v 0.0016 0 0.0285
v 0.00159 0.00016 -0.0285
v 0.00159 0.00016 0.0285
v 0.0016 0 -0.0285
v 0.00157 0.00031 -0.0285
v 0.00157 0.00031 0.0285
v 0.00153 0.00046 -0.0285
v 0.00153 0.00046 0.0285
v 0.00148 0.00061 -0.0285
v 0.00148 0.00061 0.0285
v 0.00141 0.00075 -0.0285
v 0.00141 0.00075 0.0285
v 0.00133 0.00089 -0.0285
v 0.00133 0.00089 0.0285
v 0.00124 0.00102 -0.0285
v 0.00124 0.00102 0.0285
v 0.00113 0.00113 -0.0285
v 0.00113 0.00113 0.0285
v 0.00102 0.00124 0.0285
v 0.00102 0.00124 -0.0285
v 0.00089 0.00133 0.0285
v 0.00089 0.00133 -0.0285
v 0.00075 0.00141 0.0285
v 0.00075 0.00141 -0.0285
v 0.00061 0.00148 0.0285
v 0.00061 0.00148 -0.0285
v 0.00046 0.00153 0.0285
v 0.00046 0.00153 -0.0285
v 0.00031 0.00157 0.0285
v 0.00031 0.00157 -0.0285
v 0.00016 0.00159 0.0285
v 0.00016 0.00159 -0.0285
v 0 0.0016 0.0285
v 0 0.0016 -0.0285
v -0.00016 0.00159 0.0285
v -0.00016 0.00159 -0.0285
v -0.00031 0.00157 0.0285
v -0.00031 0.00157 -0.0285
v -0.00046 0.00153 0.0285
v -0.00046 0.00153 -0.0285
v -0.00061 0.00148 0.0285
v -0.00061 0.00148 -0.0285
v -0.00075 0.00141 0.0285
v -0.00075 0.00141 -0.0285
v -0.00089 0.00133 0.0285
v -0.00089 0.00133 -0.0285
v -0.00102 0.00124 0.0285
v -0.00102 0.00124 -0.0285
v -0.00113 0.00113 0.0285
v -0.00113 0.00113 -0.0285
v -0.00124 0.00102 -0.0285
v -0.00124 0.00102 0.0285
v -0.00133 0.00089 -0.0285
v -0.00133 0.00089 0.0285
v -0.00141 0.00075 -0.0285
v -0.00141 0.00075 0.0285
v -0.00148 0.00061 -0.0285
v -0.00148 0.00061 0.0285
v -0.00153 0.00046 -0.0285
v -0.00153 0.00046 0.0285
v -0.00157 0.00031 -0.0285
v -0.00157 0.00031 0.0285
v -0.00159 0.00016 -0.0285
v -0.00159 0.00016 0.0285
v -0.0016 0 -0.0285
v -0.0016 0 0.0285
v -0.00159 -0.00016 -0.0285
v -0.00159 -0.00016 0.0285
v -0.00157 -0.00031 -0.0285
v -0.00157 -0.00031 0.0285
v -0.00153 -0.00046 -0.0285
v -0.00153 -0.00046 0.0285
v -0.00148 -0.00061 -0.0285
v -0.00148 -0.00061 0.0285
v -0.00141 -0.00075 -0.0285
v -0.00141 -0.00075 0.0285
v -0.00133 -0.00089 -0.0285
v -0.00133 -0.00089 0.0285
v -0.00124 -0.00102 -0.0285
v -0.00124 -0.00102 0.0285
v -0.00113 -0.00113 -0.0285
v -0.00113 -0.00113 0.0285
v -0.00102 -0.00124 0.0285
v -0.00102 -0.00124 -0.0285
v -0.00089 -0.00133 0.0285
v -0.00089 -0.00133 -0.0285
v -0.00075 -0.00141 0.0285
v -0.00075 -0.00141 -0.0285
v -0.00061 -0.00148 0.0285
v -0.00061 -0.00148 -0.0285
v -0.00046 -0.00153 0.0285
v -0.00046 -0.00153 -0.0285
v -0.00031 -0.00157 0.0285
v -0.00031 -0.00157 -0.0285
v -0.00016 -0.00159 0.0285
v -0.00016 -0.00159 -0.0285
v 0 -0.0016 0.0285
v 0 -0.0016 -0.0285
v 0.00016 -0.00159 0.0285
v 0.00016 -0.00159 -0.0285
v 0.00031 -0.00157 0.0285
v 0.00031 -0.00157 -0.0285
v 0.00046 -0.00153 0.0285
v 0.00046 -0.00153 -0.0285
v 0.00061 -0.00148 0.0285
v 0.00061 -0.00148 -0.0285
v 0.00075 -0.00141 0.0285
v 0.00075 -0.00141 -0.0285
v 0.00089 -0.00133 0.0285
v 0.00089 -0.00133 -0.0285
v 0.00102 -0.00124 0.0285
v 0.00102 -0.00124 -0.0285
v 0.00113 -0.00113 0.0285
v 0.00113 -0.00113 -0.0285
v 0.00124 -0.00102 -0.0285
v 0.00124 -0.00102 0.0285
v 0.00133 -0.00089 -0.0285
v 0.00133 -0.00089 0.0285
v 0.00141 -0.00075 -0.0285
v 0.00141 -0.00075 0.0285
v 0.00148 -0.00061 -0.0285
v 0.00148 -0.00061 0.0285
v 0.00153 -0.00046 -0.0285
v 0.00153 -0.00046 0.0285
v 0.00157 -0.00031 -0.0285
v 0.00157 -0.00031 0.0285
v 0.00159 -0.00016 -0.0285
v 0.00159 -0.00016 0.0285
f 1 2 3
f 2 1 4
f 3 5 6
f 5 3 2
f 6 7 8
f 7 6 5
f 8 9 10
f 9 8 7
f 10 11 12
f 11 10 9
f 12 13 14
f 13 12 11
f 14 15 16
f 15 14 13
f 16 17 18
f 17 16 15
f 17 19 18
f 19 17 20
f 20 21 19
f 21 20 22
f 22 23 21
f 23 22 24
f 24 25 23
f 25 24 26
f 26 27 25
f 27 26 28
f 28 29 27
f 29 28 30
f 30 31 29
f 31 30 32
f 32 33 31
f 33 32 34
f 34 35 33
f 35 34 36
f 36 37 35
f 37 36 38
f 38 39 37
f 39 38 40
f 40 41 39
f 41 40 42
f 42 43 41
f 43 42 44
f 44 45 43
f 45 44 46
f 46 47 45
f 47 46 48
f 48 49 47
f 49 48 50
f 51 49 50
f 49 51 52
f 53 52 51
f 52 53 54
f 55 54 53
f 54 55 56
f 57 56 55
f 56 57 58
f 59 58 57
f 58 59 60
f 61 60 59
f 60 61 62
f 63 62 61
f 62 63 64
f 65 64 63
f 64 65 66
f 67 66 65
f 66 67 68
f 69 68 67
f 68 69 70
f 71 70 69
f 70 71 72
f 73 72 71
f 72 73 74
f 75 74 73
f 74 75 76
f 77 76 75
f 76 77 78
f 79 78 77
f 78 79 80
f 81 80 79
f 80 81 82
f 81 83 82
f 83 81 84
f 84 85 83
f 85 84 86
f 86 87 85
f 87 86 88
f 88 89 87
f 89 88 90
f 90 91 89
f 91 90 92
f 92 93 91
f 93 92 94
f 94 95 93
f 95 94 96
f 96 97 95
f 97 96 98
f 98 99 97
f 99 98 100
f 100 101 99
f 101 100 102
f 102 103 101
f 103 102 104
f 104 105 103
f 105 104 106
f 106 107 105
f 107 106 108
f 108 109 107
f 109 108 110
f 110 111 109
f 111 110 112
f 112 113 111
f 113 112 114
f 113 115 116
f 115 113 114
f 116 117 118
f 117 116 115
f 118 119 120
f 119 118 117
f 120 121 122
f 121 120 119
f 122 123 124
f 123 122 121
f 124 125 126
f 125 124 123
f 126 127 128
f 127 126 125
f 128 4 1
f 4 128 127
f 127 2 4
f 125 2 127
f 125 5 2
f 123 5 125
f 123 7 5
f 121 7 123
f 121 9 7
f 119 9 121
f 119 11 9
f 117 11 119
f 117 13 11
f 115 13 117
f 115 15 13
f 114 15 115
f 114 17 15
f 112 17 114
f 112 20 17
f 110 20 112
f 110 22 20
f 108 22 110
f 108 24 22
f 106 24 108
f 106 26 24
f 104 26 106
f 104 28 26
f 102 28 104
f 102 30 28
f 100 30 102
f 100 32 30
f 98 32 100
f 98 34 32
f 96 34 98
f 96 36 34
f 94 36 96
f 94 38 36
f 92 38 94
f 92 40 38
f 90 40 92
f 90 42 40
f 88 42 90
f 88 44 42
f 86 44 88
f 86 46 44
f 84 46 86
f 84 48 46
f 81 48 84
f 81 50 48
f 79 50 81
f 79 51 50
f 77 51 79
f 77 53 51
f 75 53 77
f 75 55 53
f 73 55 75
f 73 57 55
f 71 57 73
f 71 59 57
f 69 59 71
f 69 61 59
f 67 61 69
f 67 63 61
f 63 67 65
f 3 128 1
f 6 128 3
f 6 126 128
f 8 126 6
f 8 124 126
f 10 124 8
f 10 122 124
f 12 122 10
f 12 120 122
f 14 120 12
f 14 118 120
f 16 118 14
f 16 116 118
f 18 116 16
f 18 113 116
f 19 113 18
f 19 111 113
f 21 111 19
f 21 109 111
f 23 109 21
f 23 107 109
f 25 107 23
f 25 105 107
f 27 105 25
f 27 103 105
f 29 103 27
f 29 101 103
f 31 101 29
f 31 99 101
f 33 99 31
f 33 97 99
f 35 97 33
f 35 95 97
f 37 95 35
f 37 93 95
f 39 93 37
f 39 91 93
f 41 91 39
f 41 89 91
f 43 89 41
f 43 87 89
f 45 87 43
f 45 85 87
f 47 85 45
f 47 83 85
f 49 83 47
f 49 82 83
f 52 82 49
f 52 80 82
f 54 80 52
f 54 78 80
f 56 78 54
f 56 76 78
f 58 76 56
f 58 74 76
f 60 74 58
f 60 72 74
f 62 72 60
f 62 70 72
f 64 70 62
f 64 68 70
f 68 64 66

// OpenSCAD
// Oneirifact graph source-first OpenSCAD emission (R96)
// source revision: sha256:91de11281ee0ca72128f9ecec6aa2623832f233052be8dbc6f3fa0473aa28be9
// SCAD units: meters, Z-up; $fn is tessellation only
module of_f0() {
  cylinder(h=0.56999999999999995, r=0.016, center=true, $fn=64);
}
module of_f1() {
  scale([0.10000000000000001, 0.10000000000000001, 0.10000000000000001]) of_f0();
}
of_f1();
